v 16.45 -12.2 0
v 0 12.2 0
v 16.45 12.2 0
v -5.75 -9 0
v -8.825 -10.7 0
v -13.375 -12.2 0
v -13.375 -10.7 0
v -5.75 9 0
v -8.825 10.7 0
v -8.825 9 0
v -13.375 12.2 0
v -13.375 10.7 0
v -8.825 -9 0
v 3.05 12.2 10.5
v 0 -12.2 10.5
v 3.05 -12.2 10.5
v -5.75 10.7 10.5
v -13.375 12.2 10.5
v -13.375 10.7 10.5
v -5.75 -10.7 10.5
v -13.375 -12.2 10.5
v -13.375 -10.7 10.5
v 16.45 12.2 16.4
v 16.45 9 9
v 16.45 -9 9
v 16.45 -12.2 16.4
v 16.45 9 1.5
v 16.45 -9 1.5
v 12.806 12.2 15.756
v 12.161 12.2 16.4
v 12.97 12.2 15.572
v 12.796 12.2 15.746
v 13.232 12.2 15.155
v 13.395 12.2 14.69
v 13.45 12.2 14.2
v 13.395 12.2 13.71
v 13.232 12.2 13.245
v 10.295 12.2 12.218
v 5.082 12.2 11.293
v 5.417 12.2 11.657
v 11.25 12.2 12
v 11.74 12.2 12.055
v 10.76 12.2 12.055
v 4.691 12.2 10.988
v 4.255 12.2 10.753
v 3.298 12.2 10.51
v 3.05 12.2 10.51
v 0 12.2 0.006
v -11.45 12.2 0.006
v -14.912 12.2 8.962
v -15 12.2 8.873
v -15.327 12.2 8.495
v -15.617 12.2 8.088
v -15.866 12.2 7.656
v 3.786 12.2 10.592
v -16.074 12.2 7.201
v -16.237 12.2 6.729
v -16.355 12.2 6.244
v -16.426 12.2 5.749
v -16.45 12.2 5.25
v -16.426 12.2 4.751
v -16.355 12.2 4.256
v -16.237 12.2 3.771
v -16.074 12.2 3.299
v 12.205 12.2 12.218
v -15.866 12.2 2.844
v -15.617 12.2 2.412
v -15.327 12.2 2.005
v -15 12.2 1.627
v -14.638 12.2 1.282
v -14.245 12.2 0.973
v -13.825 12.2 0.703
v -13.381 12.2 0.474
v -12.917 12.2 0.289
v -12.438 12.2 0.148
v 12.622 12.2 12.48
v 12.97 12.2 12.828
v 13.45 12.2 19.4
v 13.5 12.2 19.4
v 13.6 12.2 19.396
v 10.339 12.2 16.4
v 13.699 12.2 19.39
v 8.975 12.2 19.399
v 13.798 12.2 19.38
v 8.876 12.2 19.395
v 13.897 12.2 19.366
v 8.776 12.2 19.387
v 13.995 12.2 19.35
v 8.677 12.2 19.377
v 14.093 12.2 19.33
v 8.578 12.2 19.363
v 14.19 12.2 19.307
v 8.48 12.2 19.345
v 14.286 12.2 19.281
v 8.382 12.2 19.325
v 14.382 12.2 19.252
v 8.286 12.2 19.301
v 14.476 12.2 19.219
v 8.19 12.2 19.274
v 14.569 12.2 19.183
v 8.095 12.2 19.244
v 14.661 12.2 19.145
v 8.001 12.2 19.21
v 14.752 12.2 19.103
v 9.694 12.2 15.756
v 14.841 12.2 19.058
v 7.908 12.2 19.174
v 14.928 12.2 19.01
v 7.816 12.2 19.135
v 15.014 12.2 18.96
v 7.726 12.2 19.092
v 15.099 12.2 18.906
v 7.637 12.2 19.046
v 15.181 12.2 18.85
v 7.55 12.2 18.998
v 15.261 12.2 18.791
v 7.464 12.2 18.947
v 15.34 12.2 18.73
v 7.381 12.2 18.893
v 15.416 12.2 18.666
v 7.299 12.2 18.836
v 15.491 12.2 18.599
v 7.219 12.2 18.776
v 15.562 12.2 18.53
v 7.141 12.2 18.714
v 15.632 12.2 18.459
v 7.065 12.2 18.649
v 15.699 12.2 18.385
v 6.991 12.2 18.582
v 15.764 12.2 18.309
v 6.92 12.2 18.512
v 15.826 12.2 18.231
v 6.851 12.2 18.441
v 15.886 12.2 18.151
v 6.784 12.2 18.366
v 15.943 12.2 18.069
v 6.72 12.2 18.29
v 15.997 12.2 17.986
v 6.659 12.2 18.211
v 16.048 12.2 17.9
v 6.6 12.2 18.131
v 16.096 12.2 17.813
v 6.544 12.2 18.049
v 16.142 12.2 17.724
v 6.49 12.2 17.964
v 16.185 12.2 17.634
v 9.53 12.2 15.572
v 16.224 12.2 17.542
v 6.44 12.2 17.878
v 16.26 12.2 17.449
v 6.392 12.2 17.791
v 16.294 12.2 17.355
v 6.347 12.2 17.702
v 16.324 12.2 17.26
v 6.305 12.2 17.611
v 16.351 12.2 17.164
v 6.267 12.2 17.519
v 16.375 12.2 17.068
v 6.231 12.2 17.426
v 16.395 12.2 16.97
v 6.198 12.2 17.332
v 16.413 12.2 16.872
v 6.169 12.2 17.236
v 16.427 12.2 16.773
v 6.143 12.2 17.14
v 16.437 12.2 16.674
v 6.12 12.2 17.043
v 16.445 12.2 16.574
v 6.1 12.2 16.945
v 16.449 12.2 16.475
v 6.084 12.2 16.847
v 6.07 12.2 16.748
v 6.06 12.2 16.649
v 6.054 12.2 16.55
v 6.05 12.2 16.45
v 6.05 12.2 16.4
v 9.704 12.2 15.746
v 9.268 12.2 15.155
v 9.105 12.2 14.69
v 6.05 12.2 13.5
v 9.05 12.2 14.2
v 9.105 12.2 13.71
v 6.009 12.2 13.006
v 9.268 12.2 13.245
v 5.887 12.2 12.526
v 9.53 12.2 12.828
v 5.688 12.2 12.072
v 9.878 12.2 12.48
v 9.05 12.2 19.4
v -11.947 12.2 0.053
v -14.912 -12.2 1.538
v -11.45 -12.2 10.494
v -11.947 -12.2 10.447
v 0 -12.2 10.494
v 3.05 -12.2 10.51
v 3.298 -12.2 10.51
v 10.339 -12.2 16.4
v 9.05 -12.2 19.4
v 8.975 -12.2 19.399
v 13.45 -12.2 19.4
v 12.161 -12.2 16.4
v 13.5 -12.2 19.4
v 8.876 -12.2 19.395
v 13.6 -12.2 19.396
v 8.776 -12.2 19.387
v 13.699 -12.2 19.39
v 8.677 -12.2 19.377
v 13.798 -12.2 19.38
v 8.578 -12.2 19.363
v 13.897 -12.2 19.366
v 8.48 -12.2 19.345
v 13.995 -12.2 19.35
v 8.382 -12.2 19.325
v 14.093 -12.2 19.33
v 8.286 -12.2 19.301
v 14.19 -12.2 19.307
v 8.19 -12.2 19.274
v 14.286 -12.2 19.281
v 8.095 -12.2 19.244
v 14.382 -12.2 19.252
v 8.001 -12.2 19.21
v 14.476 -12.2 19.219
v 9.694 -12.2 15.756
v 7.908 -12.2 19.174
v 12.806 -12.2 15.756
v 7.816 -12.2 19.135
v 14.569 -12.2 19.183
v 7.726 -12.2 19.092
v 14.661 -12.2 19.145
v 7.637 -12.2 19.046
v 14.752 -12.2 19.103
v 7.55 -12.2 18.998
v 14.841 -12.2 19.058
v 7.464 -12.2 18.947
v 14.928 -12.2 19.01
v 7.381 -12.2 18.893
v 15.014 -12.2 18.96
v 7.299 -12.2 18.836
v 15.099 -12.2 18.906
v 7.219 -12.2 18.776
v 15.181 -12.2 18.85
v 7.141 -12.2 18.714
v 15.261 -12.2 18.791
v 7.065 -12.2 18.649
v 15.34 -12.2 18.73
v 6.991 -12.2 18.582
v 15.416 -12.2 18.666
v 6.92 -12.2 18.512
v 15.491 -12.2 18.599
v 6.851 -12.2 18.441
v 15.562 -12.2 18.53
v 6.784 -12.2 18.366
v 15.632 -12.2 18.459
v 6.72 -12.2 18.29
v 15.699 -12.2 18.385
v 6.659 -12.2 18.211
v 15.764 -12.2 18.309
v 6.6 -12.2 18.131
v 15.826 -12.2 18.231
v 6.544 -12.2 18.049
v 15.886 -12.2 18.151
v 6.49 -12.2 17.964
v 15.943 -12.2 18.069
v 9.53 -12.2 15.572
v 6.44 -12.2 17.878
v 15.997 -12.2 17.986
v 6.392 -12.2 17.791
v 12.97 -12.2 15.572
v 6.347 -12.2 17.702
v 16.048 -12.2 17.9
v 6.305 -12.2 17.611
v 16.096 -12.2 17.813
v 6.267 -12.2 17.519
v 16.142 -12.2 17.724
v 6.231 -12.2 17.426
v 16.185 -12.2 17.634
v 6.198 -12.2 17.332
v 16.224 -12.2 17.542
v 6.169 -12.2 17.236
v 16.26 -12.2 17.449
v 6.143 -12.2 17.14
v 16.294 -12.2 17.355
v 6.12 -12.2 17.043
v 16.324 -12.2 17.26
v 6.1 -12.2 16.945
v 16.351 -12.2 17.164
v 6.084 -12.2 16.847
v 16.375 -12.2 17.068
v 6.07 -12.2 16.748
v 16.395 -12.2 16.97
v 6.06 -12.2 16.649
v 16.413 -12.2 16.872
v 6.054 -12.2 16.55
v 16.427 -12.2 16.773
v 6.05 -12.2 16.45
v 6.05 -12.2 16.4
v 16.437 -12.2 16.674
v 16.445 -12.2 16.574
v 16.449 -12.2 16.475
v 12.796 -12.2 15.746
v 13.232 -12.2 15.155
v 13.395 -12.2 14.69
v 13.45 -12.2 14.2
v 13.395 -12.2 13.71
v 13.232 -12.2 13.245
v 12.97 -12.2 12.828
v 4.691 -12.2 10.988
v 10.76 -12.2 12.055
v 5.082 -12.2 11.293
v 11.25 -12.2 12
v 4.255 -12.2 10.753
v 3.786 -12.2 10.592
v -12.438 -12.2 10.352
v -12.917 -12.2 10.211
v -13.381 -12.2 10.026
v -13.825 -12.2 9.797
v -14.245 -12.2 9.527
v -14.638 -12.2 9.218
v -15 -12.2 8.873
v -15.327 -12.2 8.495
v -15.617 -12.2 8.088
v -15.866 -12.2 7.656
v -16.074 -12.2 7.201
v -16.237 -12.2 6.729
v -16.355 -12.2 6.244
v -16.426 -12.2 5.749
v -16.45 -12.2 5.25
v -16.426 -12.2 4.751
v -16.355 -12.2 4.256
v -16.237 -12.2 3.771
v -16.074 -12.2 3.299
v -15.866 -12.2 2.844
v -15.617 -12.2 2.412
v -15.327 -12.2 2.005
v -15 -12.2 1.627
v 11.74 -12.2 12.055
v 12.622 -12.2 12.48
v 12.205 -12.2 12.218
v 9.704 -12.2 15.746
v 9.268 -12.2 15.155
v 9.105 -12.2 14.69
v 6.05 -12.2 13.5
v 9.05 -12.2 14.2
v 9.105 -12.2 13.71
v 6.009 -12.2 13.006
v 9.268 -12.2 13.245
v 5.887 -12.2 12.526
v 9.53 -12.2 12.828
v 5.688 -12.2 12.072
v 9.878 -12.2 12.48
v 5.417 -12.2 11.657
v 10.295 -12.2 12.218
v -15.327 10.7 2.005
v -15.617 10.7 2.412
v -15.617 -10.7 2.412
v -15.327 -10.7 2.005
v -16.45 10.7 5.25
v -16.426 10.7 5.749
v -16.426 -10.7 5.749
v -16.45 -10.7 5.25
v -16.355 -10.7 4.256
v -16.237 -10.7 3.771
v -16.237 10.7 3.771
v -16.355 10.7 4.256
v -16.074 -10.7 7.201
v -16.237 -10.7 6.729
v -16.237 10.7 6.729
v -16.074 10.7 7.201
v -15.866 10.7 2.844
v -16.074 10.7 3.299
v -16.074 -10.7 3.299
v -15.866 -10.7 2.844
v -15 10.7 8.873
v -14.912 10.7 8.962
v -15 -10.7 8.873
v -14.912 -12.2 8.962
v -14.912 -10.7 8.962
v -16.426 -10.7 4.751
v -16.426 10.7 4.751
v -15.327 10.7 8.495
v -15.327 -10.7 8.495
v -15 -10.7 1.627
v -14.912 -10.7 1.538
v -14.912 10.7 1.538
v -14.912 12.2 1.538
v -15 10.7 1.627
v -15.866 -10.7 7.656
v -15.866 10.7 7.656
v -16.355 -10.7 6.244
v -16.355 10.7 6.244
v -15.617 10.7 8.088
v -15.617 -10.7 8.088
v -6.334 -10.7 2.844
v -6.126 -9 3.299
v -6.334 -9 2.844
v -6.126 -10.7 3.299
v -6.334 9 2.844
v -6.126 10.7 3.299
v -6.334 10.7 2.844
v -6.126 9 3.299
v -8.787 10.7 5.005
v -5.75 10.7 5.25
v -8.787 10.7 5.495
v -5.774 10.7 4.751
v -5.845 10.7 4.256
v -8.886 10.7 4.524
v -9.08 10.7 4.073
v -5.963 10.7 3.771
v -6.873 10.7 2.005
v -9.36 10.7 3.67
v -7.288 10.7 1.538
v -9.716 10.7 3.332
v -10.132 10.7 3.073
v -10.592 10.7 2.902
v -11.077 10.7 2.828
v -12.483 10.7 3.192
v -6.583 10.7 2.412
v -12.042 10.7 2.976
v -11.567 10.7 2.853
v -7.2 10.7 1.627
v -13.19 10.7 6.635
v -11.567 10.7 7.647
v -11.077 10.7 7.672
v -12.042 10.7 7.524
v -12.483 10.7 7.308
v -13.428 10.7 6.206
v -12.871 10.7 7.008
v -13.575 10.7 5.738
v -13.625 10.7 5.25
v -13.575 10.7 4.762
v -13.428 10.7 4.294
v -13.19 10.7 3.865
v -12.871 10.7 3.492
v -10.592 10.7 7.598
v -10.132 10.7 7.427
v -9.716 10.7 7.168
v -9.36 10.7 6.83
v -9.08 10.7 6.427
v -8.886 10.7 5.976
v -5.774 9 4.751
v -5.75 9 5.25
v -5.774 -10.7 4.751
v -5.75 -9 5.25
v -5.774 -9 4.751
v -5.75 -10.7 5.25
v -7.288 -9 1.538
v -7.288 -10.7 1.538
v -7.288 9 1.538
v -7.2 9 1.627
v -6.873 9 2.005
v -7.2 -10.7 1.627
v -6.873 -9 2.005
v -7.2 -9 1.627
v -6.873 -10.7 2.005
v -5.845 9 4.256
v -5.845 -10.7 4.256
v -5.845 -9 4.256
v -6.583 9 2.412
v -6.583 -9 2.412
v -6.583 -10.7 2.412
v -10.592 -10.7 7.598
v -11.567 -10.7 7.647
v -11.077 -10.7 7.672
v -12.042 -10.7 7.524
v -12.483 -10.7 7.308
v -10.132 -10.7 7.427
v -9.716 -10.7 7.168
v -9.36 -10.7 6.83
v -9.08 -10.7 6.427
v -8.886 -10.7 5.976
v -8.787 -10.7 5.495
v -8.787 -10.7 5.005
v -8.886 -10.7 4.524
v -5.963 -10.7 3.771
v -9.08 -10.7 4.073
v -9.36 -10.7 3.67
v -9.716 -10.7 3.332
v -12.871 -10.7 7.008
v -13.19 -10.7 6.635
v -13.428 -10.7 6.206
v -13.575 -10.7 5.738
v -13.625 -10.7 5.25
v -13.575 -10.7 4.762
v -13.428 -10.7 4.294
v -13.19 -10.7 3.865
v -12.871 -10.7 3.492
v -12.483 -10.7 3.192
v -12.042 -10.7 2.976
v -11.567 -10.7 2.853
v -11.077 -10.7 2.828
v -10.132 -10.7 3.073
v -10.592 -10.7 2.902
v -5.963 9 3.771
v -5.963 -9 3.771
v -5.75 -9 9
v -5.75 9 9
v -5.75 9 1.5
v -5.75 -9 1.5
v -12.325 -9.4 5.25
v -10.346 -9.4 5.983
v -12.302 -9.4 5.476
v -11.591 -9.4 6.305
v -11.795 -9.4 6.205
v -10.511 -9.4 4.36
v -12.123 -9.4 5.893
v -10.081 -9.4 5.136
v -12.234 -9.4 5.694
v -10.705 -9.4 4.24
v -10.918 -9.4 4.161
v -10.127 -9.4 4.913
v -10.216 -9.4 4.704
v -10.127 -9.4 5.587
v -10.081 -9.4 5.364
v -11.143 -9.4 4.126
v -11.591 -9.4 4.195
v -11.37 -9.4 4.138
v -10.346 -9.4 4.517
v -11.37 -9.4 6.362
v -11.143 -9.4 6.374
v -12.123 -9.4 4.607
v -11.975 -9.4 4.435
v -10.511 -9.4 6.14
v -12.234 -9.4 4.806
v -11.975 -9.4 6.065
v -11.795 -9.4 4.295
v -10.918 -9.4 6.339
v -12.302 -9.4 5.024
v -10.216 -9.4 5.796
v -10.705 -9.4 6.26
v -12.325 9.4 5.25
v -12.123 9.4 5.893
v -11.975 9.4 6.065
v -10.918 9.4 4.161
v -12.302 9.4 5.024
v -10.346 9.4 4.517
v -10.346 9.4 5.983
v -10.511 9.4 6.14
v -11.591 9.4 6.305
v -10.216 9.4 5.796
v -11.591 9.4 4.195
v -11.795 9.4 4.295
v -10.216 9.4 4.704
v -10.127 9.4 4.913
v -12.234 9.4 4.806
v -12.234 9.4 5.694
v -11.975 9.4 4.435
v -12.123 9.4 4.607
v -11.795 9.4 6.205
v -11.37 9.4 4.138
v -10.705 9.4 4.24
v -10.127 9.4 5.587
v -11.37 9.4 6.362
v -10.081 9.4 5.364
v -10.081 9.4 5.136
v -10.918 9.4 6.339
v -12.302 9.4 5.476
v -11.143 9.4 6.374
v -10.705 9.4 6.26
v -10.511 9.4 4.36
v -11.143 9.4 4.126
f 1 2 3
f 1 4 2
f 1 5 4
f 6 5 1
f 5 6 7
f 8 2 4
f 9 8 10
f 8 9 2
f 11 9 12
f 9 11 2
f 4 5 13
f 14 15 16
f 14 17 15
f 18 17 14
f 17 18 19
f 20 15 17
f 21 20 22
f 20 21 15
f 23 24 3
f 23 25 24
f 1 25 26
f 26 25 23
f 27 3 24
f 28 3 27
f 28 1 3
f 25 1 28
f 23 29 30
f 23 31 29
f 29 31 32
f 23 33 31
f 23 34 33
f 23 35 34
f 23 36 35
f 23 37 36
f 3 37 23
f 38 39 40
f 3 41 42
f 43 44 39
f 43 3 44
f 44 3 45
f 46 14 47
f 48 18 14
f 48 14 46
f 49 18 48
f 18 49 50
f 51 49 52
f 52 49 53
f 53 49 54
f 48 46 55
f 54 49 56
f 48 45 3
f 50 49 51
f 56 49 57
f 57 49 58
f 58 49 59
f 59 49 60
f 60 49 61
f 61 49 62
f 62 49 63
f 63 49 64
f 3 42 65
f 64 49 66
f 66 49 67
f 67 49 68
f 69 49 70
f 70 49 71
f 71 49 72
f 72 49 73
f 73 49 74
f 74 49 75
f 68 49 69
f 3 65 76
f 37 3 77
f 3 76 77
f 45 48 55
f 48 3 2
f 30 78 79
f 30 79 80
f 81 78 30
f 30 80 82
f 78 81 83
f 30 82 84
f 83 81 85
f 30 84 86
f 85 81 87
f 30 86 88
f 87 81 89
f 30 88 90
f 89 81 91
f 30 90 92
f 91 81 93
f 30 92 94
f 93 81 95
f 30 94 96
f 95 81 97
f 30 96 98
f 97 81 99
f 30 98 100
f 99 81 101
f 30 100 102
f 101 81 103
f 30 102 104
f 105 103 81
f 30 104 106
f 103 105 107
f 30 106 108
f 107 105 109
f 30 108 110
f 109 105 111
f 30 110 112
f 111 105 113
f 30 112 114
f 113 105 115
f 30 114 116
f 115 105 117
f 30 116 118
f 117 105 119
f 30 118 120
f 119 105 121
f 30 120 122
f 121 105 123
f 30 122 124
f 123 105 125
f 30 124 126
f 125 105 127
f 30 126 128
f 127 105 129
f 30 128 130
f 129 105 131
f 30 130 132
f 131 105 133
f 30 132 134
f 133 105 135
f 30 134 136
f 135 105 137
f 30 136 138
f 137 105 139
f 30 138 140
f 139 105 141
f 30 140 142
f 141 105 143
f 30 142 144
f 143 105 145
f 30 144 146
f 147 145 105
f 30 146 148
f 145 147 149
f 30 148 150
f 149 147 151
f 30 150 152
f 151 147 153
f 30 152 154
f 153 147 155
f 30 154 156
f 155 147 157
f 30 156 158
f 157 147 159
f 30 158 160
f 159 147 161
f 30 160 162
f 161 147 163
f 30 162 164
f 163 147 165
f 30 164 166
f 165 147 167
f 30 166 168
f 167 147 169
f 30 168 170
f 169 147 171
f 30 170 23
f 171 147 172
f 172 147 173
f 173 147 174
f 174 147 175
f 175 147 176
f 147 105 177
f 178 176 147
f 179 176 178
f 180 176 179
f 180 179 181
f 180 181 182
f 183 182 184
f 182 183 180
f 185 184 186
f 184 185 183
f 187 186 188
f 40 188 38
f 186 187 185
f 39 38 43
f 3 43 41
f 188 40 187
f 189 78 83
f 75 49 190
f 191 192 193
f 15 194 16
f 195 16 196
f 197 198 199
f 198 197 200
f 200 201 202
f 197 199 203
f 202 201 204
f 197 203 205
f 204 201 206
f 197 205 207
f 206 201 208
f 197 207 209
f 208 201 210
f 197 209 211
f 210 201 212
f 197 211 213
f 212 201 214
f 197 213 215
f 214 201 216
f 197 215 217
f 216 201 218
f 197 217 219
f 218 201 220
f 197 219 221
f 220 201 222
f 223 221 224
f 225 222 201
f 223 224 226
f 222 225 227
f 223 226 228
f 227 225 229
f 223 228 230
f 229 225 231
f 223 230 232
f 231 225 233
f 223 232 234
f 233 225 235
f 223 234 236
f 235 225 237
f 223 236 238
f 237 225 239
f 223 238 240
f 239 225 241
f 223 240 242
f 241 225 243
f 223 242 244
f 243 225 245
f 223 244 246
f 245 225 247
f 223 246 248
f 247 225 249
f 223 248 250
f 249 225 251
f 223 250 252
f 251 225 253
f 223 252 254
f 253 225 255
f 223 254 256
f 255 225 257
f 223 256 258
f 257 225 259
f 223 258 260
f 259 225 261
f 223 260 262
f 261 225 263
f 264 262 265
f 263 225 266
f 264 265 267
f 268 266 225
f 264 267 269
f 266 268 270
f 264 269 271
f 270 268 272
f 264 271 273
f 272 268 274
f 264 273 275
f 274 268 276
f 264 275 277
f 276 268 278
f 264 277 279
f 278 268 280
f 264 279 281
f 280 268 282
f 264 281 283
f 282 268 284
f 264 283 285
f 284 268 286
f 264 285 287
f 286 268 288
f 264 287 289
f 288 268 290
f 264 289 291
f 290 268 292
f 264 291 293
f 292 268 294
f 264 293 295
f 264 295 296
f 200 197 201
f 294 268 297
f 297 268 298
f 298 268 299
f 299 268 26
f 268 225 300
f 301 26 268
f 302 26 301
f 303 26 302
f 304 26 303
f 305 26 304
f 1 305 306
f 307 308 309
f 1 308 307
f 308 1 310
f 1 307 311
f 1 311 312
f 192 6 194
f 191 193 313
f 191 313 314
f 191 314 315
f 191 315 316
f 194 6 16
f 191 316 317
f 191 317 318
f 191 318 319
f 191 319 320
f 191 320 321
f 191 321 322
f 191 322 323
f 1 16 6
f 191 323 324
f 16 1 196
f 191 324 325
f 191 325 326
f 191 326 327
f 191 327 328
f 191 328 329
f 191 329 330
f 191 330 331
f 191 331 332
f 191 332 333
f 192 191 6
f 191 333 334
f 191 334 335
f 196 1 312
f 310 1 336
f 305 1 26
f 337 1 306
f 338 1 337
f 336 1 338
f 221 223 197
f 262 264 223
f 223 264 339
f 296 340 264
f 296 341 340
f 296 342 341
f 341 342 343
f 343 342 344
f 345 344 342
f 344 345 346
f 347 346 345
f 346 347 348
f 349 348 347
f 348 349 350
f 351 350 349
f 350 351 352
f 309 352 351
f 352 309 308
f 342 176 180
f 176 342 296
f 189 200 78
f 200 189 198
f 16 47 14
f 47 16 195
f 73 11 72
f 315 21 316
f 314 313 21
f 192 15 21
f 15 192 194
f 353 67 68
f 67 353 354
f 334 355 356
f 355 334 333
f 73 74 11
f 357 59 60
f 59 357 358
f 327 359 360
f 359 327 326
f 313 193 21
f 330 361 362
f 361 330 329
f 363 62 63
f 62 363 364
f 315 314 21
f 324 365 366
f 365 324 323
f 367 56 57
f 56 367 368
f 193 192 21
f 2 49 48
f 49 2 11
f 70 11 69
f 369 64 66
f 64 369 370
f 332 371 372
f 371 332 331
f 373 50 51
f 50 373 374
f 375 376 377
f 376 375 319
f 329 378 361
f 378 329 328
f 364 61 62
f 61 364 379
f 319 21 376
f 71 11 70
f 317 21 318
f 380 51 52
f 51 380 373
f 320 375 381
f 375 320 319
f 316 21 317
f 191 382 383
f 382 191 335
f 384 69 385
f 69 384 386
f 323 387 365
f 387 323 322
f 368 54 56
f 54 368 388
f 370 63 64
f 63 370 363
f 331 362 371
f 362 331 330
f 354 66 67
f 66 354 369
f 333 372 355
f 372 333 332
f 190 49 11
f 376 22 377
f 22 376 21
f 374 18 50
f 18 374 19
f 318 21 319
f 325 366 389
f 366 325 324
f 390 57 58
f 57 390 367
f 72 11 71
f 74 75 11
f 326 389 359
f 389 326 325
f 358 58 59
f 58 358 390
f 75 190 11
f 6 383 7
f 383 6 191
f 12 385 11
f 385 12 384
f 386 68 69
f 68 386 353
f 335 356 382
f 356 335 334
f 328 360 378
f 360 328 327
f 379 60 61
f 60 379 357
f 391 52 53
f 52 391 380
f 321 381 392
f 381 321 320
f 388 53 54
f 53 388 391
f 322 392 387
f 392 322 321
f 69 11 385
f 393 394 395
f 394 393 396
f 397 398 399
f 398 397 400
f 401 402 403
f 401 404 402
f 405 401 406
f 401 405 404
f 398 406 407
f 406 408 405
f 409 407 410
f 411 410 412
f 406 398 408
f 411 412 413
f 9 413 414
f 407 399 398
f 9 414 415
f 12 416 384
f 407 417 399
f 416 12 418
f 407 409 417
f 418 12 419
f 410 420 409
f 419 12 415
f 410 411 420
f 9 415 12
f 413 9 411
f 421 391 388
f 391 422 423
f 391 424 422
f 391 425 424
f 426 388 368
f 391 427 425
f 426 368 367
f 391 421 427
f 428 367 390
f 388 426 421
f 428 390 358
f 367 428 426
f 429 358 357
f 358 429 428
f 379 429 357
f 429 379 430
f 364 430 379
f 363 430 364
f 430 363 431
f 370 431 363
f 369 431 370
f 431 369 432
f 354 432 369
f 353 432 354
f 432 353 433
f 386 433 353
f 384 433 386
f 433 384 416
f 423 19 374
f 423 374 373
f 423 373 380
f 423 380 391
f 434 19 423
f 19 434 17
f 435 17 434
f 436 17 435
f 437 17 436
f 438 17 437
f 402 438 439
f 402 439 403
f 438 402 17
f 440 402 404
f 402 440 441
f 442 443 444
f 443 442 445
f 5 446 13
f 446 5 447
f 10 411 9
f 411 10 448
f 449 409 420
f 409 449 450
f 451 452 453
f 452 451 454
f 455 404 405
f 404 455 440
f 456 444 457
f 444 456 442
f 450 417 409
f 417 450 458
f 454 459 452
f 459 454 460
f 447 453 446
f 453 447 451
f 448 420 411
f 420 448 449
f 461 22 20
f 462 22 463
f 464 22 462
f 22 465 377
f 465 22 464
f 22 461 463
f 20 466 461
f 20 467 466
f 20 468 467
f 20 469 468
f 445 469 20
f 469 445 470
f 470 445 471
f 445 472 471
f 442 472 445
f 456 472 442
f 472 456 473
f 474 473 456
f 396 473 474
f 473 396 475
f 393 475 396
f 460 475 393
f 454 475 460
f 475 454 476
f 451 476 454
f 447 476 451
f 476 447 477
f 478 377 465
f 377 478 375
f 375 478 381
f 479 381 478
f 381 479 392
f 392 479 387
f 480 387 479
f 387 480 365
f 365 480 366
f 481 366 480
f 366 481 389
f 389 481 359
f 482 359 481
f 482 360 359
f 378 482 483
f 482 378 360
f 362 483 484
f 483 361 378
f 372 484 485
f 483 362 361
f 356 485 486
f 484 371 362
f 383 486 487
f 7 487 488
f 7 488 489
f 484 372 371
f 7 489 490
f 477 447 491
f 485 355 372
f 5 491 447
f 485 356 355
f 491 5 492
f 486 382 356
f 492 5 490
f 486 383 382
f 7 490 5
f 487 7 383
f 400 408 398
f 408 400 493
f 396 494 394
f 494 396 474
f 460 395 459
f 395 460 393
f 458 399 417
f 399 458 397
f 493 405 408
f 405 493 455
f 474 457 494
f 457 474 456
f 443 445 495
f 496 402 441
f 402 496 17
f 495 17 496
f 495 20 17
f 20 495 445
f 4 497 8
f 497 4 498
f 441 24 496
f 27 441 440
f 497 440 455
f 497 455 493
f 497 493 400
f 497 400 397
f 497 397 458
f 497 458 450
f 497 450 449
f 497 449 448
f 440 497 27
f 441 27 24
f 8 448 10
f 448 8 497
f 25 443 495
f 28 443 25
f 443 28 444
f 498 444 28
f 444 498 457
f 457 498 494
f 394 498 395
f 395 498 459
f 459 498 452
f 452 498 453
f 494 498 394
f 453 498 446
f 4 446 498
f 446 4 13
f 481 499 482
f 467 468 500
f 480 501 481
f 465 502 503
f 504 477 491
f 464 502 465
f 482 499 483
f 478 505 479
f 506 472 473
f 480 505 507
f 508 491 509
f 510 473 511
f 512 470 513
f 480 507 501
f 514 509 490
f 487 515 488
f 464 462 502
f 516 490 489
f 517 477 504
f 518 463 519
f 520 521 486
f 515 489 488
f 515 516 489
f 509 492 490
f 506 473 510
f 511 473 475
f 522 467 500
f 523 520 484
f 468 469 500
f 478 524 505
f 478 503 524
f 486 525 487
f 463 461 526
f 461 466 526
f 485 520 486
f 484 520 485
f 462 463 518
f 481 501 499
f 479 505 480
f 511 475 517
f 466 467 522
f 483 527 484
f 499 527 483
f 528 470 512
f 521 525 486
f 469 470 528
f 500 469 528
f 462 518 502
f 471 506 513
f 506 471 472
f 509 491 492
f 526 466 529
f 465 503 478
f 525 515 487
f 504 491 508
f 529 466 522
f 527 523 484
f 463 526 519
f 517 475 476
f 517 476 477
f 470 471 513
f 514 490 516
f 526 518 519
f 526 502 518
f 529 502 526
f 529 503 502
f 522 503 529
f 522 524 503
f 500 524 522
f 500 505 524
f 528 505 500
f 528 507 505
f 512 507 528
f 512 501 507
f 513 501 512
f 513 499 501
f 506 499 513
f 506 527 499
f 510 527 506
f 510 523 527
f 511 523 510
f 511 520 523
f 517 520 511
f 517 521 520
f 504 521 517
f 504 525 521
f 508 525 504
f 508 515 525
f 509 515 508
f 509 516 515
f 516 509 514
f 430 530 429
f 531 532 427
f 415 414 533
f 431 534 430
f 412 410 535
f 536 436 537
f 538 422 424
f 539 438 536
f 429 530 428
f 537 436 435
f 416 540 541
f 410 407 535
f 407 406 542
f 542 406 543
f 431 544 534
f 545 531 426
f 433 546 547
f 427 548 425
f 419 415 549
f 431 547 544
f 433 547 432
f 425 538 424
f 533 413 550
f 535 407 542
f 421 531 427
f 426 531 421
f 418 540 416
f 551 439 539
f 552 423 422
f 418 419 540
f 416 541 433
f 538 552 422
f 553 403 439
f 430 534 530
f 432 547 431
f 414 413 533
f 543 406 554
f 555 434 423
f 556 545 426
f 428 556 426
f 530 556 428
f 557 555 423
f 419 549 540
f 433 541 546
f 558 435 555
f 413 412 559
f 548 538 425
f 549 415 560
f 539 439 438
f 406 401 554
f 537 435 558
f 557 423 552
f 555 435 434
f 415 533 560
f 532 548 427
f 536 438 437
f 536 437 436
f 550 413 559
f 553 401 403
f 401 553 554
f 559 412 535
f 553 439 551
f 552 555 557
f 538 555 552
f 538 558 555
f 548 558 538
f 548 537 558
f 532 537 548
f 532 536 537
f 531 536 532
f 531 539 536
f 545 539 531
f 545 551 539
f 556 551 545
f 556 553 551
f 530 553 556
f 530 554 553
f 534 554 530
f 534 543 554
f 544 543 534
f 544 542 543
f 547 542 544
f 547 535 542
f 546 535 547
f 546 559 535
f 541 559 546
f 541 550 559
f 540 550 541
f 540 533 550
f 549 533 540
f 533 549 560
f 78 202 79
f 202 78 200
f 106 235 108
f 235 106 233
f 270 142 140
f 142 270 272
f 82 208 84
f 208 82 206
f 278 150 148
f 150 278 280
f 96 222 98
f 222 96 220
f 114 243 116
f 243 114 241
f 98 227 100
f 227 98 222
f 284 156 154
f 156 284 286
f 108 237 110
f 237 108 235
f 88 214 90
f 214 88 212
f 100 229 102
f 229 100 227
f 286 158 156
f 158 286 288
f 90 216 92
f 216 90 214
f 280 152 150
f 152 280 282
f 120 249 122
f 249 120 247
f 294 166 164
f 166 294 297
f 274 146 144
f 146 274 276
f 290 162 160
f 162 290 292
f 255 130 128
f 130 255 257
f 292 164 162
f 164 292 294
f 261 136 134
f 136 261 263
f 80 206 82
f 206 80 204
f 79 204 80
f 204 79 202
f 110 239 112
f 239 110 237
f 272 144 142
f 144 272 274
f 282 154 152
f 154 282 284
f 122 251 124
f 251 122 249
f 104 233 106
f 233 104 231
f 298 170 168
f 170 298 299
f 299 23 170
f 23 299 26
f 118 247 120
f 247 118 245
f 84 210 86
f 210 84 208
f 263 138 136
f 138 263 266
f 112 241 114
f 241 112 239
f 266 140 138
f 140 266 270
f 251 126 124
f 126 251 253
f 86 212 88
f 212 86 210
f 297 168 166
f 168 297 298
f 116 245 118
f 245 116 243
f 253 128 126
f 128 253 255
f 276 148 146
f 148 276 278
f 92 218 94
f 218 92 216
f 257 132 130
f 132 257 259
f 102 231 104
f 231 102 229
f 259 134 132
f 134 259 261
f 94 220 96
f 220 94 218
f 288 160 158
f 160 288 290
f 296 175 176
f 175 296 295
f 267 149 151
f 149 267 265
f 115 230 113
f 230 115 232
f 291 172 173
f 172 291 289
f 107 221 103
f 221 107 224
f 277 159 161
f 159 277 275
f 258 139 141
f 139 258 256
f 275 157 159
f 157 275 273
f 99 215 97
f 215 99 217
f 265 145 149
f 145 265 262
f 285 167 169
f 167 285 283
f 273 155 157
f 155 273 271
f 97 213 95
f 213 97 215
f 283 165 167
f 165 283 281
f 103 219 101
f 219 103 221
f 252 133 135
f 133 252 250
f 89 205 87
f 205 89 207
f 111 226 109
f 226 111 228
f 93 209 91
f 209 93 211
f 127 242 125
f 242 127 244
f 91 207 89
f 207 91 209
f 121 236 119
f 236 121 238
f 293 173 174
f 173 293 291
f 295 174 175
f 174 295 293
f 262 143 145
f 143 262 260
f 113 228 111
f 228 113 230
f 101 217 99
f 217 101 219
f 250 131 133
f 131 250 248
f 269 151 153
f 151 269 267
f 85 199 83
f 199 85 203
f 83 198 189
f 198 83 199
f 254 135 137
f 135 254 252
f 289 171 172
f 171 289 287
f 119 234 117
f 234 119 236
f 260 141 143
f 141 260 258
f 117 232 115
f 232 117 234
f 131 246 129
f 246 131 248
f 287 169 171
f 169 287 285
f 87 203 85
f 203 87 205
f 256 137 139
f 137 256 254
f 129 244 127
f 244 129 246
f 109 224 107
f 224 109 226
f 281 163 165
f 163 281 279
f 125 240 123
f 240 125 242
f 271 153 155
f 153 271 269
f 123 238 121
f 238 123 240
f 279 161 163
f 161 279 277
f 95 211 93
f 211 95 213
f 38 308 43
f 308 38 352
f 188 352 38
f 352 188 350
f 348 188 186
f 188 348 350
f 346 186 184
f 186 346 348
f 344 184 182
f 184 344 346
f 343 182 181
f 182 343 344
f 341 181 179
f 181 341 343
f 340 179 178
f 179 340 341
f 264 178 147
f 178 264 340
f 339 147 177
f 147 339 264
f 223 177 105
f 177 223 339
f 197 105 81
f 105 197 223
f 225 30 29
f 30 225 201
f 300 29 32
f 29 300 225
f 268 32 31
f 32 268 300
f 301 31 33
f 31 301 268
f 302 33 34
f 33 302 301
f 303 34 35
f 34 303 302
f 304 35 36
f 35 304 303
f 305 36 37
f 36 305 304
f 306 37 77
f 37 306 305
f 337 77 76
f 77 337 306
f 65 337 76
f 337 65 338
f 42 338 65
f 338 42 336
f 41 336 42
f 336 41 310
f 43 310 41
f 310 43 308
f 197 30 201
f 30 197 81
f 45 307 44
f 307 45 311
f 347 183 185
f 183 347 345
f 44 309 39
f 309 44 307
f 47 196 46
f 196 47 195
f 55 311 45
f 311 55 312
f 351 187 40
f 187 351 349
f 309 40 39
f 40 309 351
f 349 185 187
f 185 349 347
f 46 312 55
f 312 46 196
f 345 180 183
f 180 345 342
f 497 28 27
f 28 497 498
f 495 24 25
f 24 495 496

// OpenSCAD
// file: functions.scad
/*******************************************************************

This OpenSCAD code and its rendered 3D model are part of the

	Kühling&Kühling RepRap Industrial 3D Printer


All details, BOM, assembling instructions and latest sources:
	http://kuehlingkuehling.de

Designed and developed by:
	Jonas Kühling <mail@jonaskuehling.de>
	Simon Kühling <mail@simonkuehling.de>

Licensed under:
	Creative Commons Attribution-ShareAlike
	CC BY-SA 3.0
	http://creativecommons.org/licenses/by-sa/3.0/

*******************************************************************/

module teardrop (r=4.5,h=20,alpha=45,teardropcorner=0,fulldrop=0){		// tear drop hole for top-centering
											// use teardropcorner=1 for bottom horizontal corners
	render()
	translate([-h/2,0,0])
		rotate([-270,0+(teardropcorner*180),90])
			difference(){
				linear_extrude(height=h){
					circle(r);
					polygon(points=[[0,0],[r*cos(alpha),r*sin(alpha)],[0,r/sin(alpha)],[-r*cos(alpha),r*sin(alpha)]], paths=[[0,1,2,3]]);
				}
				if(fulldrop==0) 
					translate([0,(r/sin(alpha))/2+r,h/2]) cube([2*r+2,r/sin(alpha),h+2],center=true);
			}
}

//teardrop(4.5,22,fulldrop=true);



module teardropcentering (r=4.5,h=20,alpha=45){				// tear drop hole for top-centering
	centering_offset_factor = 1.1;
	render()
	translate([-h/2,0,0])
		rotate([-270,0,90])
			difference(){
				linear_extrude(height=h){
					circle(r, $fn=24);
					polygon(points=[[0,0],[r*cos(alpha),r*sin(alpha)],[0,r/sin(alpha)],[-r*cos(alpha),r*sin(alpha)]], paths=[[0,1,2,3]]);
				}
				translate([0,(r/sin(alpha))/2+r*centering_offset_factor,h/2]) cube([2*r+2,r/sin(alpha),h+2],center=true);
			}
}

//teardropcentering();



module teardropcentering_half (r=4.5,h=20, bottom=0,alpha=45){				// tear drop hole for top-centering
																// upper half (bottom=0) or bottom half (bottom=1)
	centering_offset_factor = 1.2;
	render()
	translate([-h/2,0,0])
		rotate([-270,0,90])
			difference(){
				linear_extrude(height=h){
					circle(r, $fn=24);
					polygon(points=[[0,0],[r*cos(alpha),r*sin(alpha)],[0,r/sin(alpha)],[-r*cos(alpha),r*sin(alpha)]], paths=[[0,1,2,3]]);
				}
				translate([0,(r/sin(alpha))/2+r*centering_offset_factor,h/2]) cube([2*r+2,r/sin(alpha),h+2],center=true);
				translate([0,-(r*centering_offset_factor)/2-0.5+bottom*(r*centering_offset_factor+1),h/2]) cube([2*r+2,r*centering_offset_factor+1,h+2],center=true);
			}
}

//teardropcentering_half(bottom=0);


module polyhole(d,h){
	n = max(round(2 * d),3);
	cylinder(h = h, r = (d / 2) / cos (180 / n), $fn = n, center=true);
}



module roundcorner(radius,edge_length){
	render()
	translate([0,0,-1])
		difference(){
			translate([-1,-1,0])
				cube(size = [radius+1,radius+1,edge_length+2], center = false);
			translate(v = [radius,radius,-1])
				cylinder(h = edge_length+4, r=radius, center=false,$fs=0.1);
		}
}

//roundcorner(5,5);



module roundcorner_tear(radius,edge_length){
	render()
	difference(){
		translate([-1,-1,-1])
			cube(size = [edge_length+2, radius+1, radius+1], center = false);
		translate([(edge_length+4)/2-2, radius, radius])
			teardrop(radius, edge_length+4,teardropcorner=1);
	}
}

//roundcorner_tear(8,20);


module roundedge_tear(radius){
	render()
	difference(){
		translate([-1,-1,-1])
			cube(size = [radius+1, radius+1, radius+1], center = false);
		translate([radius,radius,radius])
			union(){
				sphere(r=radius, $fs=0.1);
				translate([0,0,-radius])
					cylinder(r1=(radius*sin(45))-(radius-(radius*sin(45))),r2=radius*sin(45),h=(radius-(radius*sin(45))), $fs=0.1);
			}
	}
}

//roundedge_tear(20);



module roundedge(radius){
	render()
	difference(){
		translate([-1,-1,-1])
			cube(size = [radius+1, radius+1, radius+1], center = false);
		translate([radius,radius,radius])
			sphere(r=radius, $fs=0.1);
	}
}

//roundedge(5);


module nut_trap(nut_wrench_size,trap_height,vertical=0, clearance=0.2,center=true){		// M3 wrench size = 5.5
	radius = cornerdiameter(nut_wrench_size+2*clearance) /2;
	rotate([0,vertical*90,0])
		cylinder(h = trap_height, r = radius, center=center, $fn = 6);
}

//nut_trap(5,5,0);

module nut_slot(nut_wrench_size,nut_height, nut_elevation,vertical=0, clearance=0.2){		// M3 wrench size = 5.5
	radius = cornerdiameter(nut_wrench_size+2*clearance) /2;
	slot_height = nut_height+2*clearance;
	slot_width = nut_wrench_size+2*clearance;
	rotate([0,vertical*270,0]){
		cylinder(h = slot_height, r = radius, center=true, $fn = 6);
		translate([0,-slot_width/2,-slot_height/2]) cube([nut_elevation+1,slot_width,slot_height]);
	}
}

//nut_slot(5.5,3,4,1);

function cornerdiameter(wrench_size) =  2* ((wrench_size)/2)/ cos(180/6);
function cornerdiameter_8(wrench_size) =  2* ((wrench_size)/2)/ cos(180/8);
// main file
/*******************************************************************

This OpenSCAD code and its rendered 3D model are part of the

	Kühling&Kühling RepRap Industrial 3D Printer


All details, BOM, assembling instructions and latest sources:
	http://kuehlingkuehling.de

Designed and developed by:
	Jonas Kühling <mail@jonaskuehling.de>
	Simon Kühling <mail@simonkuehling.de>

Licensed under:
	Creative Commons Attribution-ShareAlike
	CC BY-SA 3.0
	http://creativecommons.org/licenses/by-sa/3.0/

*******************************************************************/

include <configuration.scad>


x_cablechain_wall = 2;
x_cablechain_width = 43 + (6*x_cablechain_wall+2*clearance);
x_cablechain_height = 15 + (2*x_cablechain_wall);
x_cablechain_additional_length = 10;

y_cablechain_wall = 1.5;
y_cablechain_width = 15 + (6*y_cablechain_wall+2*clearance);
y_cablechain_height = 7.5 + (2*y_cablechain_wall);
y_cablechain_additional_length = 10;

z_cablechain_wall = 1.5;
z_cablechain_width = 15 + (6*z_cablechain_wall+2*clearance);
z_cablechain_height = 7.5 + (2*z_cablechain_wall);
z_cablechain_additional_length = 10;




// RENDER FOR PRINTING

// X AXIS LINK
//translate([0,0,x_cablechain_height]) rotate([0,180,0])
//cablechain(x_cablechain_width,x_cablechain_height,x_cablechain_wall,x_cablechain_additional_length,end=0,dividers=2);

// Y AXIS LINK
//translate([0,0,y_cablechain_height]) rotate([0,180,0])
//cablechain(y_cablechain_width,y_cablechain_height,y_cablechain_wall,y_cablechain_additional_length,end=0,dividers=0);

// Z AXIS LINK
//translate([0,0,z_cablechain_height]) rotate([0,180,0])
//cablechain(z_cablechain_width,z_cablechain_height,z_cablechain_wall,z_cablechain_additional_length,end=0,dividers=0);



// X AXIS CHAIN-END FRAME
//translate([0,0,x_cablechain_height]) rotate([0,180,0])
//cablechain(x_cablechain_width,x_cablechain_height,x_cablechain_wall,x_cablechain_additional_length,end=1,dividers=2);

// Y AXIS CHAIN-END FRAME
//translate([0,0,y_cablechain_height]) rotate([0,180,0])
//cablechain(y_cablechain_width,y_cablechain_height,y_cablechain_wall,y_cablechain_additional_length,end=4,dividers=0);

// Z AXIS CHAIN-END FRAME
//translate([0,0,z_cablechain_height]) rotate([0,180,0])
//cablechain(z_cablechain_width,z_cablechain_height,z_cablechain_wall,z_cablechain_additional_length,end=1,dividers=0);



// X AXIS CHAIN-END EXTRUDER
//translate([0,0,x_cablechain_height]) rotate([0,180,0])
//cablechain(x_cablechain_width,x_cablechain_height,x_cablechain_wall,x_cablechain_additional_length,end=2,dividers=2);

// Y AXIS CHAIN-END BRIDGE
//translate([0,0,y_cablechain_height]) rotate([0,180,0])
//cablechain(y_cablechain_width,y_cablechain_height,y_cablechain_wall,y_cablechain_additional_length,end=3,dividers=0);

// Z AXIS CHAIN-END BED
translate([0,0,z_cablechain_height]) rotate([0,180,0])
cablechain(z_cablechain_width,z_cablechain_height,z_cablechain_wall,z_cablechain_additional_length,end=2,dividers=0);


// end = 0 for usual cable chain link
// end = 1 for cable chain frame mount flat
// end = 2 for cable chain extruder & z-stage mount (x&z)
// end = 3 for cable chain y bridge mount
// end = 4 for cable chain frame mount front


module cablechain(cablechain_width,cablechain_height,cablechain_wall,cablechain_additional_length, end=0, dividers=0){

	cablechain_length = 2*cablechain_height+cablechain_wall+2*clearance + cablechain_additional_length;

	difference(){

		// main body
		union(){

			// chain link body
			hull(){
				translate([-cablechain_length/2+cablechain_height/2,0,cablechain_height/2])
					rotate([180,0,0]) rotate([0,0,90])
						teardrop(cablechain_height/2,cablechain_width);
				translate([cablechain_length/2-cablechain_height/2,0,cablechain_height/2])
					rotate([180,0,0]) rotate([0,0,90])
						teardrop(cablechain_height/2,cablechain_width);
				translate([-cablechain_length/2+cablechain_height/2,0,cablechain_height/2])
					rotate([0,0,90])
						teardrop(cablechain_height/2,cablechain_width);
				translate([cablechain_length/2-cablechain_height/2,0,cablechain_height/2])
					rotate([0,0,90])
						teardrop(cablechain_height/2,cablechain_width);
			}

			// end = 1; frame mount flat
			if (end == 1)
				translate()
					hull(){
						translate([max(cablechain_length/2,frame_width-frame_enclosure_thickness-clearance)-wall,cablechain_width/2+(clearance+frame_screw_washer_dia/2+frame_screw_dia/2+clearance+wall)-wall,cablechain_height-2*wall])
							cylinder(r=wall,h=2*wall);
						translate([max(cablechain_length/2,frame_width-frame_enclosure_thickness-clearance)-wall,-cablechain_width/2-(clearance+frame_screw_washer_dia/2+frame_screw_dia/2+clearance+wall)+wall,cablechain_height-2*wall])
							cylinder(r=wall,h=2*wall);
						translate([max(cablechain_length/2,frame_width-frame_enclosure_thickness-clearance)-(frame_width-frame_enclosure_thickness-clearance)+wall,cablechain_width/2+(clearance+frame_screw_washer_dia/2+frame_screw_dia/2+clearance+wall)-wall,cablechain_height-2*wall])
							cylinder(r=wall,h=2*wall);
						translate([max(cablechain_length/2,frame_width-frame_enclosure_thickness-clearance)-(frame_width-frame_enclosure_thickness-clearance)+wall,-cablechain_width/2-(clearance+frame_screw_washer_dia/2+frame_screw_dia/2+clearance+wall)+wall,cablechain_height-2*wall])
							cylinder(r=wall,h=2*wall);
					}

			// end = 2; extruder/z-stage mount
			if (end == 2){
				translate([-cablechain_length/2,-cablechain_width/2,0])
					cube([cablechain_length/2,cablechain_width,cablechain_height]);
				translate([-cablechain_length/2,-cablechain_width/2,cablechain_wall-(wall+2*clearance+extruder_cablechain_mount_screw_dia+wall)])
					cube([wall+2*clearance+extruder_cablechain_mount_screw_dia+wall,cablechain_width,wall+2*clearance+extruder_cablechain_mount_screw_dia+wall]);
				translate([-cablechain_length/2+(wall+2*clearance+extruder_cablechain_mount_screw_dia+wall),-cablechain_width/2,-wall])
					cube([wall,cablechain_width,wall]);
/*
				translate([-cablechain_length/2-(clearance+extruder_cablechain_mount_screw_washer_dia/2+extruder_cablechain_mount_screw_dia/2+clearance+wall),-cablechain_width/2-wall,0])
					cube([cablechain_length/2+clearance+extruder_cablechain_mount_screw_washer_dia/2+extruder_cablechain_mount_screw_dia/2+clearance+wall,wall+2*cablechain_wall+clearance,cablechain_height]);
*/
			}

			// end = 3; y-bridge mount
			if (end == 3)
				mirror([1,0,0])
					hull(){
						translate([cablechain_length/2+clearance+x_idler_bolt_washer_dia-wall,-cablechain_width/2+(wall+clearance+rod_dia/2+y_rod_y_belt_x_dist)+x_idler_bolt_washer_dia/2-wall,cablechain_height-2*wall])
							cylinder(r=wall,h=2*wall);
						translate([cablechain_length/2+clearance+x_idler_bolt_washer_dia-wall,-cablechain_width/2+wall,cablechain_height-2*wall])
							cylinder(r=wall,h=2*wall);
						translate([wall,-cablechain_width/2+(wall+clearance+rod_dia/2+y_rod_y_belt_x_dist)+x_idler_bolt_washer_dia/2-wall,cablechain_height-2*wall])
							cylinder(r=wall,h=2*wall);
						translate([wall,-cablechain_width/2+wall,cablechain_height-2*wall])
							cylinder(r=wall,h=2*wall);
					}

			// end = 4; frame mount front
			if (end == 4){
				mirror([1,0,0]){
					translate([-cablechain_length/2,-cablechain_width/2,0])
						cube([cablechain_length/2,cablechain_width,cablechain_height]);
					translate([-cablechain_length/2,-(cablechain_width/2+frame_width-frame_enclosure_thickness-clearance),0])
						cube([2*wall,cablechain_width/2+frame_width-frame_enclosure_thickness-clearance,cablechain_height]);
					translate([-cablechain_length/2,-cablechain_width/2-wall,0])
						cube([2*wall+wall,wall+2*cablechain_wall+clearance,cablechain_height]);
				}
			}
		}

		// cable channel
		difference(){
			translate([-(cablechain_length+2)/2,-(cablechain_width-4*cablechain_wall-2*clearance)/2,cablechain_wall])
				cube([cablechain_length+2,cablechain_width-4*cablechain_wall-2*clearance,cablechain_height-2*cablechain_wall]);

			// channel dividers
			if(dividers>0)
				for(d=[1:dividers])
					translate([-(cablechain_length*4)/2,-cablechain_wall/2-cablechain_width/2+(6*x_cablechain_wall+2*clearance)/2-cablechain_wall/2+d*((cablechain_width-(6*x_cablechain_wall+2*clearance)+cablechain_wall)/(dividers+1)),-1])
					cube([cablechain_length*4,cablechain_wall,cablechain_height+2]);

		}

		// chain link 1
		if (end != 1 && end != 4)
			difference(){
				union(){
					translate([cablechain_length-cablechain_height-clearance,0,0])
						hull(){
							translate([-cablechain_length/2+cablechain_height/2,0,cablechain_height/2])
								rotate([0,0,90])
									teardrop(cablechain_height/2,cablechain_width-2*cablechain_wall,fulldrop=1);
							translate([cablechain_length/2-cablechain_height/2,0,cablechain_height/2])
								rotate([0,0,90])
									teardrop(cablechain_height/2,cablechain_width-2*cablechain_wall,fulldrop=1);
						}
					translate([cablechain_length/2-cablechain_height-clearance,-(cablechain_width-2*cablechain_wall)/2,-cablechain_height/2])
						cube([cablechain_length,cablechain_width-2*cablechain_wall,cablechain_height]);
					translate([cablechain_length/2-cablechain_height-clearance,-(cablechain_width-4*cablechain_wall-2*clearance)/2,-1])
						cube([cablechain_length,cablechain_width-4*cablechain_wall-2*clearance,cablechain_height+2]);
				}
				translate([cablechain_length/2-cablechain_height/2,-cablechain_width/2+cablechain_wall,cablechain_height/2])
					rotate([-90,0,0])
						cylinder(r1=cablechain_height/4-clearance,r2=cablechain_height/4-clearance-cablechain_wall+clearance,h=cablechain_wall-clearance);
				translate([cablechain_length/2-cablechain_height/2,cablechain_width/2-cablechain_wall,cablechain_height/2])
					rotate([90,0,0])
						cylinder(r1=cablechain_height/4-clearance,r2=cablechain_height/4-clearance-cablechain_wall+clearance,h=cablechain_wall-clearance);
			}

		if (end != 2 && end != 3){

			// chain link 2
			difference(){
				union(){
					translate([-cablechain_length+cablechain_height+clearance,0,0])
						hull(){
							translate([-cablechain_length/2+cablechain_height/2,0,cablechain_height/2])
								rotate([0,0,90])
									teardrop(cablechain_height/2,cablechain_width+2,fulldrop=1);
							translate([cablechain_length/2-cablechain_height/2,0,cablechain_height/2])
								rotate([0,0,90])
									teardrop(cablechain_height/2,cablechain_width+2,fulldrop=1);
						}
					translate([-cablechain_length-cablechain_length/2+cablechain_height+clearance,-(cablechain_width+2)/2,-cablechain_height/2])
						cube([cablechain_length,cablechain_width+2,cablechain_height]);
				}
				difference(){
					translate([-(cablechain_length*4)/2,-(cablechain_width-2*cablechain_wall-2*clearance)/2,-1])
						cube([cablechain_length*4,cablechain_width-2*cablechain_wall-2*clearance,cablechain_height+2]);
	
					translate([-cablechain_length/2+cablechain_height/2,-cablechain_width/2+cablechain_wall,cablechain_height/2])
						rotate([-90,0,0])
							cylinder(r1=cablechain_height/4,r2=cablechain_height/4-cablechain_wall,h=cablechain_wall);
					translate([-cablechain_length/2+cablechain_height/2,cablechain_width/2-cablechain_wall,cablechain_height/2])
						rotate([90,0,0])
							cylinder(r1=cablechain_height/4,r2=cablechain_height/4-cablechain_wall,h=cablechain_wall);
				}
			}
			translate([-cablechain_length-cablechain_length/2+cablechain_height/2,-(cablechain_width-4*cablechain_wall-2*clearance)/2,cablechain_height/4*3])
				cube([cablechain_length,cablechain_width-4*cablechain_wall-2*clearance,cablechain_height]);
	
			// cable clearance when tilted
			translate([-cablechain_length/2+cablechain_height/2,0,cablechain_height/2])
				for(i=[0:2])
					rotate([0,-i*45,0])
						translate([-cablechain_length/2+cablechain_height/2,0,-cablechain_height/2])
							hull(){
								translate([-cablechain_length/2+cablechain_height/2,0,cablechain_height/2])
									rotate([180,0,0]) rotate([0,0,90])
										teardrop(cablechain_height/2-cablechain_wall,cablechain_width-4*cablechain_wall-2*clearance);
								translate([cablechain_length/2-cablechain_height/2,0,cablechain_height/2])
									rotate([180,0,0]) rotate([0,0,90])
										teardrop(cablechain_height/2-cablechain_wall,cablechain_width-4*cablechain_wall-2*clearance);
								translate([-cablechain_length/2+cablechain_height/2,0,cablechain_height/2])
									rotate([0,0,90])
										teardrop(cablechain_height/2-cablechain_wall,cablechain_width-4*cablechain_wall-2*clearance);
								translate([cablechain_length/2-cablechain_height/2,0,cablechain_height/2])
									rotate([0,0,90])
										teardrop(cablechain_height/2-cablechain_wall,cablechain_width-4*cablechain_wall-2*clearance);
							}
		}

		// end = 1; frame mount flat (cuts and screw holes)
		if (end == 1){
			translate([max(cablechain_length/2,frame_width-frame_enclosure_thickness-clearance)-(frame_width-frame_enclosure_thickness-clearance),-(cablechain_width-4*cablechain_wall-2*clearance)/2,-cablechain_wall])
				cube([cablechain_length,cablechain_width-4*cablechain_wall-2*clearance,cablechain_height]);
			translate([max(cablechain_length/2,frame_width-frame_enclosure_thickness-clearance)+clearance+frame_enclosure_thickness-frame_width/2,cablechain_width/2+(clearance+frame_screw_washer_dia/2),-1])
				cylinder(r=frame_screw_dia/2+clearance,h=cablechain_height+2);
			translate([max(cablechain_length/2,frame_width-frame_enclosure_thickness-clearance)+clearance+frame_enclosure_thickness-frame_width/2,-cablechain_width/2-(clearance+frame_screw_washer_dia/2),-1])
				cylinder(r=frame_screw_dia/2+clearance,h=cablechain_height+2);
		}

		// end = 2; extruder/z-stage mount
		if (end == 2){
			translate([-cablechain_length/2,-cablechain_width/2,cablechain_wall-(wall+2*clearance+extruder_cablechain_mount_screw_dia+wall)])
				rotate([0,-90,0]) rotate([-90,0,0])
					roundcorner(wall,cablechain_width);
			translate([-cablechain_length/2+(wall+2*clearance+extruder_cablechain_mount_screw_dia+wall),-cablechain_width/2,cablechain_wall-(wall+2*clearance+extruder_cablechain_mount_screw_dia+wall)])
				rotate([0,180,0]) rotate([-90,0,0])
					roundcorner(wall,cablechain_width);
			translate([-cablechain_length/2+(wall+2*clearance+extruder_cablechain_mount_screw_dia+wall)+wall,-cablechain_width/2-1,-wall])
				rotate([-90,0,0])
					cylinder(r=wall,h=cablechain_width+2);
			translate([-cablechain_length/2+(wall+clearance+extruder_cablechain_mount_screw_dia/2),0,cablechain_wall-(wall+clearance+extruder_cablechain_mount_screw_dia/2)])
				rotate([0,0,90])
					rotate([180,0,0])
						teardrop(extruder_cablechain_mount_screw_dia/2+clearance,cablechain_width+2);
		}

		// end = 3; y-bridge mount
		if (end == 3)
			mirror([1,0,0]){
				translate([wall,-(cablechain_width-4*cablechain_wall-2*clearance)/2,-cablechain_wall])
					cube([cablechain_length/2-wall,cablechain_width-4*cablechain_wall-2*clearance,cablechain_height]);
				translate([cablechain_length/2+clearance+x_idler_bolt_washer_dia/2,-cablechain_width/2+(wall+clearance+rod_dia/2+y_rod_y_belt_x_dist),-1])
					cylinder(r=x_idler_bolt_dia/2+clearance,h=cablechain_height+2);
			}

		// end = 4; frame mount front
		if (end == 4){
			mirror([1,0,0]){
				translate([-cablechain_length/2+2*wall,-cablechain_width/2-frame_width+frame_enclosure_thickness+clearance,cablechain_height])
					rotate([0,180,0])
						roundcorner_tear(wall,wall+2*cablechain_wall+clearance);
				translate([-cablechain_length/2+2*wall,-cablechain_width/2-frame_width+frame_enclosure_thickness+clearance,0])
					rotate([0,0,90]) rotate([0,-90,0]) rotate([-90,0,0])
						roundcorner(wall,wall+2*cablechain_wall+clearance);
				translate([-cablechain_length/2+wall,-cablechain_width/2-frame_width/2,cablechain_height/2])
					rotate([180,0,0])
						teardrop(endstop_screw_dia/2+clearance,wall+2*cablechain_wall+clearance+2);
				translate([-cablechain_length/2+2*wall+wall,-cablechain_width/2-wall,-1])
					cylinder(r=wall,h=cablechain_height+2);
			}
		}

	}

	// chain link 2 hinge wall thickness
	if (end != 2 && end != 3){
		translate([-cablechain_length/2+cablechain_height/2,-cablechain_width/2+2*cablechain_wall,cablechain_height/2])
			rotate([-90,0,0])
				cylinder(r1=cablechain_height/4,r2=cablechain_height/4-cablechain_wall,h=cablechain_wall);
		translate([-cablechain_length/2+cablechain_height/2,cablechain_width/2-2*cablechain_wall,cablechain_height/2])
			rotate([90,0,0])
				cylinder(r1=cablechain_height/4,r2=cablechain_height/4-cablechain_wall,h=cablechain_wall);
	}
}
